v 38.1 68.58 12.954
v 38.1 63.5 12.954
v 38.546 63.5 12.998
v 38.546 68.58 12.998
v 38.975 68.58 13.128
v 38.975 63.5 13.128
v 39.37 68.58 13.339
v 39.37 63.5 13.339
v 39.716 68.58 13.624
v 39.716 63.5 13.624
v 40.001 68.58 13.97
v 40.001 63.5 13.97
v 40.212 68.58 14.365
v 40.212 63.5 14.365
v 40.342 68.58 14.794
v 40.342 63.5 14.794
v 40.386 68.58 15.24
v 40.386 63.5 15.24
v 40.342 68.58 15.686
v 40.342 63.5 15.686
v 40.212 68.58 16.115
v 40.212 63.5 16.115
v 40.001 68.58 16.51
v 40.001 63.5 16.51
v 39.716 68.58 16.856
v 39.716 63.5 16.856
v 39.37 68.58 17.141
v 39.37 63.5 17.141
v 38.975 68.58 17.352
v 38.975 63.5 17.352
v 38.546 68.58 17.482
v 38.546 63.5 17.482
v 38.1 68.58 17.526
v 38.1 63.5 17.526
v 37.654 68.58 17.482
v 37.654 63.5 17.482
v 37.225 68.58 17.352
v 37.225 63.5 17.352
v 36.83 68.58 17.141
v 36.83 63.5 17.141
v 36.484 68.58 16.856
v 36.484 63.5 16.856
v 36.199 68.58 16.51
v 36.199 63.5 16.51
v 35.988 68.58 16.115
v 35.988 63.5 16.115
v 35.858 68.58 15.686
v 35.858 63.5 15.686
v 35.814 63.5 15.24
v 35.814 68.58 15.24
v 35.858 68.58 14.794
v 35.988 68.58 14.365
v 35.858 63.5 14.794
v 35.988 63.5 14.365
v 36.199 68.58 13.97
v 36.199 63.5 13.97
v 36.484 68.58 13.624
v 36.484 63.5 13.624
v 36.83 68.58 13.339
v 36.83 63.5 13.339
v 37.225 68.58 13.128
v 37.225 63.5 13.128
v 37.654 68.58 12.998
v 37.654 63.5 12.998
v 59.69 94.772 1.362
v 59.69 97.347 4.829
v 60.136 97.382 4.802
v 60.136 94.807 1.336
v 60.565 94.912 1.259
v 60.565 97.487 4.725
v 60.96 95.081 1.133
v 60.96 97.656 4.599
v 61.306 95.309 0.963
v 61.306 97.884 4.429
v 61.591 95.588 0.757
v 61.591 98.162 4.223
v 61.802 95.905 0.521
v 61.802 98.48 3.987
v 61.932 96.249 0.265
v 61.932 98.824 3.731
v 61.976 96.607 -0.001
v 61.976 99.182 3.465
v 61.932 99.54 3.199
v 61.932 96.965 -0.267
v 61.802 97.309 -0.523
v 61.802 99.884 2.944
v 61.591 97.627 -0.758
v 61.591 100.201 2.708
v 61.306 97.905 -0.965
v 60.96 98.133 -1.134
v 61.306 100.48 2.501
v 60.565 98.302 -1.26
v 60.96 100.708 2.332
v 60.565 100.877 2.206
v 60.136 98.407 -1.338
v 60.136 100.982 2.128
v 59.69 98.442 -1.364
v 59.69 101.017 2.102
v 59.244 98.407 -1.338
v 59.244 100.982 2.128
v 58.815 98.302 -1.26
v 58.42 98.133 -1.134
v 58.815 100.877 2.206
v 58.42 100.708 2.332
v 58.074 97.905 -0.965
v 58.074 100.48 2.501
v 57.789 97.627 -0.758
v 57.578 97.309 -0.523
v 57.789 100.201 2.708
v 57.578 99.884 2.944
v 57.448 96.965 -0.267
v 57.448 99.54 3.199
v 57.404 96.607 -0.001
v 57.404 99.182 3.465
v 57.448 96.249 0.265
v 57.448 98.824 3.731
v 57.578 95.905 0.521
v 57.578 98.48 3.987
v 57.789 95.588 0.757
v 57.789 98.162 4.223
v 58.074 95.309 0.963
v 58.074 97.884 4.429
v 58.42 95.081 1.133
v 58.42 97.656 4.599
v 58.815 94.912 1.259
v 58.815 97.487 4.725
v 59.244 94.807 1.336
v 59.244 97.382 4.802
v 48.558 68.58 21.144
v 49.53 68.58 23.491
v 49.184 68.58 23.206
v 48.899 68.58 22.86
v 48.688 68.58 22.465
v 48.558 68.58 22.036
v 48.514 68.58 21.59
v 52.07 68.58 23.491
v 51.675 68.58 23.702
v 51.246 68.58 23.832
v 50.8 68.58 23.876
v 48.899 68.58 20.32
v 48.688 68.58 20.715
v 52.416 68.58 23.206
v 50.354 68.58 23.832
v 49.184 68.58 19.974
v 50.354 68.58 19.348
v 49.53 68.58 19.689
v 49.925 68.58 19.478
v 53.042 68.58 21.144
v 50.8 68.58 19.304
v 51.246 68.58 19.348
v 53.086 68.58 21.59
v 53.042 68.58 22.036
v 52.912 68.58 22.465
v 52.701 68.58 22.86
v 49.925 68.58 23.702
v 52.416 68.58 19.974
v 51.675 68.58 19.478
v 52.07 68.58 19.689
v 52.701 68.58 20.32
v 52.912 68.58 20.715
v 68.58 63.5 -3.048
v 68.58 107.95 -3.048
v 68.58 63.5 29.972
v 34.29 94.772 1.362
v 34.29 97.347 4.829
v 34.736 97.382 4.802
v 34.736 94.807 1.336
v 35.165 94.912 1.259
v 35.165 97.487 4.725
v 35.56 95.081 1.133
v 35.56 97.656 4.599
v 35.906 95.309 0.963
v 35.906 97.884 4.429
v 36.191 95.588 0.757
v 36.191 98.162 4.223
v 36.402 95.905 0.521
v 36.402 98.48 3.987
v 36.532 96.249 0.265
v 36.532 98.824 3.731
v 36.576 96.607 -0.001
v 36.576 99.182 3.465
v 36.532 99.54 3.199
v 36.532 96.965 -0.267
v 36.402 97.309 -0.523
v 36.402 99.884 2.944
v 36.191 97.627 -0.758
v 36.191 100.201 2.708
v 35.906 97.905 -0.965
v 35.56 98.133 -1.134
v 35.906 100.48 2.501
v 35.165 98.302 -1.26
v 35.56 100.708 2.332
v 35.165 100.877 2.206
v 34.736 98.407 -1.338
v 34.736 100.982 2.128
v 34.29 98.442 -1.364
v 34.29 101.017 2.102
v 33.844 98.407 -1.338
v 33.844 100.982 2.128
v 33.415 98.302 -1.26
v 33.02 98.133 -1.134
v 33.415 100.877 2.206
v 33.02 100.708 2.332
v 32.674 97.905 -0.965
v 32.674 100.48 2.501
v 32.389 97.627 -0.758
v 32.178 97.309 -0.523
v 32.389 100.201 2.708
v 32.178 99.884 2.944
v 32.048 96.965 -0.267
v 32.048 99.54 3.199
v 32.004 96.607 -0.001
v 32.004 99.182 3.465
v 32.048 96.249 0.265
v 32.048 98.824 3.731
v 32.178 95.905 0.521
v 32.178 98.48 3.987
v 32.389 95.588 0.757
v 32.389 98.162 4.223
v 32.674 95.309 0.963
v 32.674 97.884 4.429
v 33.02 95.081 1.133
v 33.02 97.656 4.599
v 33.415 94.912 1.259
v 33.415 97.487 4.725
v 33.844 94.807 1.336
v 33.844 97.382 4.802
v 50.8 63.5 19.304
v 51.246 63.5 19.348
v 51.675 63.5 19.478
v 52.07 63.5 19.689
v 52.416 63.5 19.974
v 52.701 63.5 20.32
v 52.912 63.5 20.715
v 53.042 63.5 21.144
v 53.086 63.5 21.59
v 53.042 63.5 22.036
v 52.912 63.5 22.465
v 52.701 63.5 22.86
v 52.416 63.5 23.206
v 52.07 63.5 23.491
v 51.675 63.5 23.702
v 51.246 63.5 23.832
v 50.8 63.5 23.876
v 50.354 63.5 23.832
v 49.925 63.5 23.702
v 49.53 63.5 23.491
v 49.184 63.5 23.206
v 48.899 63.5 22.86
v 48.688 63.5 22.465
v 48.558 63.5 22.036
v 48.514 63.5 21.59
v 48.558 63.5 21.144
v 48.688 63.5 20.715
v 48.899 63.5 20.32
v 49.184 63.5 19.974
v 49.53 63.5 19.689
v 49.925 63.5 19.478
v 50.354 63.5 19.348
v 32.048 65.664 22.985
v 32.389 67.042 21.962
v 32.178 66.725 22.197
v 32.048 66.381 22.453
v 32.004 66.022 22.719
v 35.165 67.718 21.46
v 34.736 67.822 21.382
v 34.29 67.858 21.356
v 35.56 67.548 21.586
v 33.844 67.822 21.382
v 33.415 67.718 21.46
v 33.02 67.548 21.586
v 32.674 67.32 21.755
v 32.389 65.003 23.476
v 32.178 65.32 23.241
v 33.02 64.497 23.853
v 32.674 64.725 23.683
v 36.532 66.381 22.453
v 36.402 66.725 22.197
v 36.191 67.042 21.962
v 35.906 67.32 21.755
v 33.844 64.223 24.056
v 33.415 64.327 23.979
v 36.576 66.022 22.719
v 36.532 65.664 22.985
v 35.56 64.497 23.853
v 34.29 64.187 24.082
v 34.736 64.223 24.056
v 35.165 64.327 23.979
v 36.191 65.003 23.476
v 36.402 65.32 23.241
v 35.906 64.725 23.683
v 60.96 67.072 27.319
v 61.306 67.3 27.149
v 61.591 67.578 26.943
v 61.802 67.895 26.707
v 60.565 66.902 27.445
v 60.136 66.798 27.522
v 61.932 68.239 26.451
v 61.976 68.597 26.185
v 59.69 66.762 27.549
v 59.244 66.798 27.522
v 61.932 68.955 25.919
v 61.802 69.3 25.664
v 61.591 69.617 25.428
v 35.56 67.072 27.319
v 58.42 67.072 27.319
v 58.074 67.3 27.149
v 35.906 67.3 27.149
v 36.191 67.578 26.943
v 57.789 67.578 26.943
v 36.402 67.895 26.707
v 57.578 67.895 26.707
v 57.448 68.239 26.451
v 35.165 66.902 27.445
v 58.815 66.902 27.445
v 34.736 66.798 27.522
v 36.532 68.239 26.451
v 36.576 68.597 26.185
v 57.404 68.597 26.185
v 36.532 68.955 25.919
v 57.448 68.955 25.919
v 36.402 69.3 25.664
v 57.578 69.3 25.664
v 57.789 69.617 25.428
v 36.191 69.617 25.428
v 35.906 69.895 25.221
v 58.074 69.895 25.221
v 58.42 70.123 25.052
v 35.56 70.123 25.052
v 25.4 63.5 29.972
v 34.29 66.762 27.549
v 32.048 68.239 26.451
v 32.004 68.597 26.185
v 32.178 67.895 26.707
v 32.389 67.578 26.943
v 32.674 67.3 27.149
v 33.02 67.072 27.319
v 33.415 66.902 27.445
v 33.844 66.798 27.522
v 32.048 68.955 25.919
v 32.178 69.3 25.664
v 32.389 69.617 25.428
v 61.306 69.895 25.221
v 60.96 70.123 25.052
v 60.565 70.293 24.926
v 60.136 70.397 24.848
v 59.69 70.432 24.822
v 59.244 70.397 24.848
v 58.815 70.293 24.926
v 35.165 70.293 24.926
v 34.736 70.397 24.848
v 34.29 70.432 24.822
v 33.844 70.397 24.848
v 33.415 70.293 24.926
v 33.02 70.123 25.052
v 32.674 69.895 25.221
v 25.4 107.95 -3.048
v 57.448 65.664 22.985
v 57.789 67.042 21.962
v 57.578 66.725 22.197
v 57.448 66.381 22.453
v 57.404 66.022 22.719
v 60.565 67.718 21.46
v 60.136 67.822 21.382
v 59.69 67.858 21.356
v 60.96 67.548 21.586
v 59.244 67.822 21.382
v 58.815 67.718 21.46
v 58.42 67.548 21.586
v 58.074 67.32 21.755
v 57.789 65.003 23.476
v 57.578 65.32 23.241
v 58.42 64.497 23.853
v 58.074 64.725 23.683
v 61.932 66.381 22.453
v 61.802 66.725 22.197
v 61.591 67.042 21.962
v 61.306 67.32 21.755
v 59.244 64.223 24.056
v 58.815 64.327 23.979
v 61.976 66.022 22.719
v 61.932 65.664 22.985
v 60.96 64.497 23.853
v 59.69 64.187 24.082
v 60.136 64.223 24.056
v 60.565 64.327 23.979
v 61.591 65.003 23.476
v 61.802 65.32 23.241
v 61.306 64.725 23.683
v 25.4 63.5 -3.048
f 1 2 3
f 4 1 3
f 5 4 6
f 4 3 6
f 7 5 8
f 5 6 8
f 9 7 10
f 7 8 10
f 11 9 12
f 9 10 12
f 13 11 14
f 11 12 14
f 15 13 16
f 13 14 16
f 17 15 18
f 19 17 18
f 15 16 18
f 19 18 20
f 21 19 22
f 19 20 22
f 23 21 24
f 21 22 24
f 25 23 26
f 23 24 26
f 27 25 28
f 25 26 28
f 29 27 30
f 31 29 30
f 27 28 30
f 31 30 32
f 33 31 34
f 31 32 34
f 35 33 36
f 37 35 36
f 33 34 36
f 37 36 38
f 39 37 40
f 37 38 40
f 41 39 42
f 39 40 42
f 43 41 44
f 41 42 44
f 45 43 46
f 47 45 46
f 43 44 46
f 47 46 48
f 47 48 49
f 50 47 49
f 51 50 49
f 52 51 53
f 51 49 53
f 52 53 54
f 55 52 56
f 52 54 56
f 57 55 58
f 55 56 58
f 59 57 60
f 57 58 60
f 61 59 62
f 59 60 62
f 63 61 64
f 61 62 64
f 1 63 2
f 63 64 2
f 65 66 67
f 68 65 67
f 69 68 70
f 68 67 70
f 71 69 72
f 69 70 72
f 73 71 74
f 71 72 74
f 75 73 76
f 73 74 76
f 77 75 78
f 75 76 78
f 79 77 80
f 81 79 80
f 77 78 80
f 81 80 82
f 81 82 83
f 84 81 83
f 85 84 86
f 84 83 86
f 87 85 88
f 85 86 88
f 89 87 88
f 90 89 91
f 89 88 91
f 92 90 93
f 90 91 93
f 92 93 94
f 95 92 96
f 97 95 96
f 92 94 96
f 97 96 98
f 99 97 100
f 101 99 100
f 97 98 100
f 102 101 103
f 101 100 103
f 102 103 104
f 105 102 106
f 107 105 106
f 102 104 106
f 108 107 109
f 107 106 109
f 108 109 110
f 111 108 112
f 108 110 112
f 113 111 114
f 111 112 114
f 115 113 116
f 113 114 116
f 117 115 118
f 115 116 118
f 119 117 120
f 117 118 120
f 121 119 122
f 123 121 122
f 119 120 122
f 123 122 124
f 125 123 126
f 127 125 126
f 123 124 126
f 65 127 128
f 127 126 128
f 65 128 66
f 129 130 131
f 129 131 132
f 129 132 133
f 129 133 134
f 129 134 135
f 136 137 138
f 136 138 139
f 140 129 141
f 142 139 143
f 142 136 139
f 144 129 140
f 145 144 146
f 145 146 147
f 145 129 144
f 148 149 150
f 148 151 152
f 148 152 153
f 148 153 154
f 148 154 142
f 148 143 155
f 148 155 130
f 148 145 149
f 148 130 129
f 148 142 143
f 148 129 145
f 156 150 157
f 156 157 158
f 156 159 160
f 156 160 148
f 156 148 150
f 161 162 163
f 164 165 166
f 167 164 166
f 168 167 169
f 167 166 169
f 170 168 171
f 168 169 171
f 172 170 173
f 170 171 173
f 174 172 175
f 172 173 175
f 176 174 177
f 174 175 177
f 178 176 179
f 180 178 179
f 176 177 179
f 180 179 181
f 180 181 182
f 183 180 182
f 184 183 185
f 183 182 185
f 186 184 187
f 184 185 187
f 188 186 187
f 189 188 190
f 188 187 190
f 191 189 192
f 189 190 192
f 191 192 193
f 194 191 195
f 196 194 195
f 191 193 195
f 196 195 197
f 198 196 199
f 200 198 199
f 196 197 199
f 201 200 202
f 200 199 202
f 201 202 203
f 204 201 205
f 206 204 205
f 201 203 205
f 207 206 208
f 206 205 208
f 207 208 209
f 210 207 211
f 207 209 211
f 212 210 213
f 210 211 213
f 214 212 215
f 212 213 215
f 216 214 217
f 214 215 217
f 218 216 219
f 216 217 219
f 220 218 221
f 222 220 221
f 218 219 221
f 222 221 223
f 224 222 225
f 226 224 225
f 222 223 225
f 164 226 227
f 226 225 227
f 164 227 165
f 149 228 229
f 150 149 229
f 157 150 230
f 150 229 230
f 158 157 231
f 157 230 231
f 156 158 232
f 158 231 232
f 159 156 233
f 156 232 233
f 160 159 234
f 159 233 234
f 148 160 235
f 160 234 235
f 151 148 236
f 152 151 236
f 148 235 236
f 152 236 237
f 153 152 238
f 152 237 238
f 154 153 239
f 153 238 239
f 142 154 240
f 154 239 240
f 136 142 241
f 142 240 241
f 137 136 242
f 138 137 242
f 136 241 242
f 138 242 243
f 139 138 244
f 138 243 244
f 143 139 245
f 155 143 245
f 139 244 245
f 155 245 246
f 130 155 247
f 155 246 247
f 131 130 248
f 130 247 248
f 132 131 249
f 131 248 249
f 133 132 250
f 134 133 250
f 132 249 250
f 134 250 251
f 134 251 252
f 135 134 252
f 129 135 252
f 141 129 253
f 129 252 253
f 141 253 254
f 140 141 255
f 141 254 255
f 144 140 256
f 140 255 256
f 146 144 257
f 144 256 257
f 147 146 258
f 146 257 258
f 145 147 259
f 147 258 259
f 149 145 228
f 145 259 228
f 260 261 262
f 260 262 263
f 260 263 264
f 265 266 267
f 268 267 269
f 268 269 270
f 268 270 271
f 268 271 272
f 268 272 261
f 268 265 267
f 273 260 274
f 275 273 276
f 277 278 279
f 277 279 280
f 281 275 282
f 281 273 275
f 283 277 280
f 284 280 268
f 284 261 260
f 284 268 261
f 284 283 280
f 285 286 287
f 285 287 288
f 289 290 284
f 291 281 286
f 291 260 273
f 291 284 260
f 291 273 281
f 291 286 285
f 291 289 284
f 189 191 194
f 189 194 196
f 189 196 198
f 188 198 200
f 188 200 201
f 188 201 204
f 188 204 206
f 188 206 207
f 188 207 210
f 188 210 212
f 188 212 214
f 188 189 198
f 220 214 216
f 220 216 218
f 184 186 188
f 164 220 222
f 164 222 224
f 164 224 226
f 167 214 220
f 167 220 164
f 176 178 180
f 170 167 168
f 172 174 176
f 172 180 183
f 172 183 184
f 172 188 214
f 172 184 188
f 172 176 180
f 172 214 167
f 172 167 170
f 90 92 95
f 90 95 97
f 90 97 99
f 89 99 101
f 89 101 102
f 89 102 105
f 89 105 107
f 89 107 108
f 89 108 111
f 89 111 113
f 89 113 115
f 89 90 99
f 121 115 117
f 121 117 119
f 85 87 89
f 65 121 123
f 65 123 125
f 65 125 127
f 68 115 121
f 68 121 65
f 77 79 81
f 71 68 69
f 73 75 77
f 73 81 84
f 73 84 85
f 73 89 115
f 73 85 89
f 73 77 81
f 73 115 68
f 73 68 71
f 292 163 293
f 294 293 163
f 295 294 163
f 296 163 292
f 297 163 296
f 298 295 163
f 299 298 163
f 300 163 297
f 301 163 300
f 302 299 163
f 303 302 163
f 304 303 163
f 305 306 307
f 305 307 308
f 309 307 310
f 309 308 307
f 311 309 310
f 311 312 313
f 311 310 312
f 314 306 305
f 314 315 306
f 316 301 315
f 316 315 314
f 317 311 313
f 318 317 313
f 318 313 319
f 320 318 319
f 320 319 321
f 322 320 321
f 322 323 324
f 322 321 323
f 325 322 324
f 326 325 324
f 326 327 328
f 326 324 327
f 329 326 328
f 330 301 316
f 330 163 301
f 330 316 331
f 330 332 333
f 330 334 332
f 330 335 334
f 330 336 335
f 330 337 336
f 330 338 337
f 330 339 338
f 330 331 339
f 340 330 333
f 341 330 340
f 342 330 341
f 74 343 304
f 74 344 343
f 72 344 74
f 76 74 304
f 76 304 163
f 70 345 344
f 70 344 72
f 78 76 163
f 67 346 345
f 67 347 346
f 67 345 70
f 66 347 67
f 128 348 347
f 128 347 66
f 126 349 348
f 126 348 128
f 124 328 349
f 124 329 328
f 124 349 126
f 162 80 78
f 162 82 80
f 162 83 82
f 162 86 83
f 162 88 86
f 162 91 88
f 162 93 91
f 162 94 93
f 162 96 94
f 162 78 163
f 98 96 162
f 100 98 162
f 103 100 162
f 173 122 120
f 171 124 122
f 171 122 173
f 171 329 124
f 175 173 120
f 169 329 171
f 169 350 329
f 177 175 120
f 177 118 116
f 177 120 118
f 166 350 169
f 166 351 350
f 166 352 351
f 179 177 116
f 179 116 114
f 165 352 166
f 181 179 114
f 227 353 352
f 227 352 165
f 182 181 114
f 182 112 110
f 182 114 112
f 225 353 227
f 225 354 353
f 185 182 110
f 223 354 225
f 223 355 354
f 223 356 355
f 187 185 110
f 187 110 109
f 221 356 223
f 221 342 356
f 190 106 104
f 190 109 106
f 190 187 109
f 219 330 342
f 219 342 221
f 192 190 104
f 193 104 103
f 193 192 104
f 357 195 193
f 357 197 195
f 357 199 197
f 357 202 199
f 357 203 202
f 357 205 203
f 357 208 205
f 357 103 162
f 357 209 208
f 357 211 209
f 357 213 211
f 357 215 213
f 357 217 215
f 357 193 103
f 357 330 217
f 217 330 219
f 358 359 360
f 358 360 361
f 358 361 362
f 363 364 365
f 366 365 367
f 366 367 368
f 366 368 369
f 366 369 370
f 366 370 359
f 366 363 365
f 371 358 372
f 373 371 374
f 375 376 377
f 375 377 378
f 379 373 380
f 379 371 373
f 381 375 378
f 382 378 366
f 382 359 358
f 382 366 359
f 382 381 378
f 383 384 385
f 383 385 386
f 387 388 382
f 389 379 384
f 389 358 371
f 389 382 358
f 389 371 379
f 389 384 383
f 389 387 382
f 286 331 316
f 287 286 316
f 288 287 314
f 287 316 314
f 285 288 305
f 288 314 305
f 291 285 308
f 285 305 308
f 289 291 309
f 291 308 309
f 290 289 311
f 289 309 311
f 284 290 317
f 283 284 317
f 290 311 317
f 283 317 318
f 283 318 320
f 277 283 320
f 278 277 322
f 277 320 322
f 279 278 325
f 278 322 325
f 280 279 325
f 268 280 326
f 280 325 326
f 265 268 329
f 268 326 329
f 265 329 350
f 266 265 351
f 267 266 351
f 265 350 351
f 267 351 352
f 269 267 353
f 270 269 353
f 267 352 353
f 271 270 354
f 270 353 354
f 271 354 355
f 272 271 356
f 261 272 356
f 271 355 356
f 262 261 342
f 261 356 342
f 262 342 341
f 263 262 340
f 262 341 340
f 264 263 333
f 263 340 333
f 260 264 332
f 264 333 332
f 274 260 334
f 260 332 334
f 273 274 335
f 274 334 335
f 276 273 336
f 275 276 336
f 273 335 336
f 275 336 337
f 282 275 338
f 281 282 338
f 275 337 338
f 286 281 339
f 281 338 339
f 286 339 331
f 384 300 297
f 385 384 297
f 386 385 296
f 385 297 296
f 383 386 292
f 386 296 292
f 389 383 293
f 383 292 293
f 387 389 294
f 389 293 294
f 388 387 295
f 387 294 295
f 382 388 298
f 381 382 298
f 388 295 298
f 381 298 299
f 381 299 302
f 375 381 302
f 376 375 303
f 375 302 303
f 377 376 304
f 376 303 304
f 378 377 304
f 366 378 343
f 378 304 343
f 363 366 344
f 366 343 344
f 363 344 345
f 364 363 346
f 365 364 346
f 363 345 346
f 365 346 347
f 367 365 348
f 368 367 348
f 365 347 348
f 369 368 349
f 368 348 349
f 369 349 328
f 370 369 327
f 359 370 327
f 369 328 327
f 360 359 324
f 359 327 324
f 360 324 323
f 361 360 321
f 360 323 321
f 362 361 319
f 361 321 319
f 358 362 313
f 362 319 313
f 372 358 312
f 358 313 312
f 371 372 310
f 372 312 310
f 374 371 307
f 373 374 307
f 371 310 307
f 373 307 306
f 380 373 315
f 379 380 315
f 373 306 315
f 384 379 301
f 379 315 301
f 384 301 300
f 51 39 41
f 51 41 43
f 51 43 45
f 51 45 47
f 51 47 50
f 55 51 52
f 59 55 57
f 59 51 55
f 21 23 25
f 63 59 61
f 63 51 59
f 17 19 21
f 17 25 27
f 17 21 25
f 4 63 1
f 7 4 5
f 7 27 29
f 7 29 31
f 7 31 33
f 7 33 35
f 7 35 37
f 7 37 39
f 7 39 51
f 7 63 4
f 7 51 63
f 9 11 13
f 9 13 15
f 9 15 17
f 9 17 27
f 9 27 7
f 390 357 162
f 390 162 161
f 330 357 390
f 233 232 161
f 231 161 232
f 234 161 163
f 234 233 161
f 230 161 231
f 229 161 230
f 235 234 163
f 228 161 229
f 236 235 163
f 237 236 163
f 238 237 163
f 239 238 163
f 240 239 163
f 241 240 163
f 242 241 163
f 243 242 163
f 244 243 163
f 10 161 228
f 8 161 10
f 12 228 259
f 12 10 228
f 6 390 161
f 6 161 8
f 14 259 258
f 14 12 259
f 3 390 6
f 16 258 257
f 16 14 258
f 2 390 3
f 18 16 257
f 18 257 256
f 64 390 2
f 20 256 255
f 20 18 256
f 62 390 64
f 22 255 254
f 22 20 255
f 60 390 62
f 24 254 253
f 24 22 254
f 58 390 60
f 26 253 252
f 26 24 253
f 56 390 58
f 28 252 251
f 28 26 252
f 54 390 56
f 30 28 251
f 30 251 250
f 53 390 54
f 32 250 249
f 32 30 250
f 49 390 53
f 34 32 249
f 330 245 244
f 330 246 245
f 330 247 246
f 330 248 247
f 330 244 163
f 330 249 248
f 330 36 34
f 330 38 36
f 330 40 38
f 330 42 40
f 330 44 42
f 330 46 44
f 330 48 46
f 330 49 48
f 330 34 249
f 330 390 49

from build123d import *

# Parameters (mm, degrees)
PAD032_DEPTH    = 43.18
SKETCH068_R     = 2.286
POCKET031_DEPTH = 5.08
SKETCH069_R     = 2.286
POCKET032_DEPTH = 4.318


with BuildPart() as part:
    # Sketch067 → Pad032 (new body)
    with BuildSketch(Plane.YZ):
        Polygon((0, 0), (0, 33.02), (44.45, 0), align=None)
    extrude(amount=PAD032_DEPTH)

    # Sketch068 (on Face1 of Pad032) → Pocket031 (cut)
    with BuildSketch(Plane(origin=(0, 0, 0), x_dir=(0, 0, -1), z_dir=(0, -1, 0))):
        with Locations((-18.288, 12.7)):
            Circle(SKETCH068_R)
        with Locations((-24.638, 25.4)):
            Circle(SKETCH068_R)
    extrude(amount=-POCKET031_DEPTH, mode=Mode.SUBTRACT)

    # Sketch069 (on Face5 of Pocket031) → Pocket032 (cut)
    with BuildSketch(Plane(origin=(0, 15.8065228827, 21.2780115729), x_dir=(0, -0.802743848, 0.5963240013), z_dir=(0, 0.5963240013, 0.802743848))):
        with Locations((13.3406185242, 34.29)):
            Circle(SKETCH069_R)
        with Locations((13.3406185242, 8.89)):
            Circle(SKETCH069_R)
        with Locations((-24.7593814758, 34.29)):
            Circle(SKETCH069_R)
        with Locations((-24.7593814758, 8.89)):
            Circle(SKETCH069_R)
    extrude(amount=-POCKET032_DEPTH, mode=Mode.SUBTRACT)


with BuildPart() as part_1:
    # Body024 placement: moved
    add(part.part.moved(Location((25.4, 63.5, -3.048))))


solid = part_1.part
